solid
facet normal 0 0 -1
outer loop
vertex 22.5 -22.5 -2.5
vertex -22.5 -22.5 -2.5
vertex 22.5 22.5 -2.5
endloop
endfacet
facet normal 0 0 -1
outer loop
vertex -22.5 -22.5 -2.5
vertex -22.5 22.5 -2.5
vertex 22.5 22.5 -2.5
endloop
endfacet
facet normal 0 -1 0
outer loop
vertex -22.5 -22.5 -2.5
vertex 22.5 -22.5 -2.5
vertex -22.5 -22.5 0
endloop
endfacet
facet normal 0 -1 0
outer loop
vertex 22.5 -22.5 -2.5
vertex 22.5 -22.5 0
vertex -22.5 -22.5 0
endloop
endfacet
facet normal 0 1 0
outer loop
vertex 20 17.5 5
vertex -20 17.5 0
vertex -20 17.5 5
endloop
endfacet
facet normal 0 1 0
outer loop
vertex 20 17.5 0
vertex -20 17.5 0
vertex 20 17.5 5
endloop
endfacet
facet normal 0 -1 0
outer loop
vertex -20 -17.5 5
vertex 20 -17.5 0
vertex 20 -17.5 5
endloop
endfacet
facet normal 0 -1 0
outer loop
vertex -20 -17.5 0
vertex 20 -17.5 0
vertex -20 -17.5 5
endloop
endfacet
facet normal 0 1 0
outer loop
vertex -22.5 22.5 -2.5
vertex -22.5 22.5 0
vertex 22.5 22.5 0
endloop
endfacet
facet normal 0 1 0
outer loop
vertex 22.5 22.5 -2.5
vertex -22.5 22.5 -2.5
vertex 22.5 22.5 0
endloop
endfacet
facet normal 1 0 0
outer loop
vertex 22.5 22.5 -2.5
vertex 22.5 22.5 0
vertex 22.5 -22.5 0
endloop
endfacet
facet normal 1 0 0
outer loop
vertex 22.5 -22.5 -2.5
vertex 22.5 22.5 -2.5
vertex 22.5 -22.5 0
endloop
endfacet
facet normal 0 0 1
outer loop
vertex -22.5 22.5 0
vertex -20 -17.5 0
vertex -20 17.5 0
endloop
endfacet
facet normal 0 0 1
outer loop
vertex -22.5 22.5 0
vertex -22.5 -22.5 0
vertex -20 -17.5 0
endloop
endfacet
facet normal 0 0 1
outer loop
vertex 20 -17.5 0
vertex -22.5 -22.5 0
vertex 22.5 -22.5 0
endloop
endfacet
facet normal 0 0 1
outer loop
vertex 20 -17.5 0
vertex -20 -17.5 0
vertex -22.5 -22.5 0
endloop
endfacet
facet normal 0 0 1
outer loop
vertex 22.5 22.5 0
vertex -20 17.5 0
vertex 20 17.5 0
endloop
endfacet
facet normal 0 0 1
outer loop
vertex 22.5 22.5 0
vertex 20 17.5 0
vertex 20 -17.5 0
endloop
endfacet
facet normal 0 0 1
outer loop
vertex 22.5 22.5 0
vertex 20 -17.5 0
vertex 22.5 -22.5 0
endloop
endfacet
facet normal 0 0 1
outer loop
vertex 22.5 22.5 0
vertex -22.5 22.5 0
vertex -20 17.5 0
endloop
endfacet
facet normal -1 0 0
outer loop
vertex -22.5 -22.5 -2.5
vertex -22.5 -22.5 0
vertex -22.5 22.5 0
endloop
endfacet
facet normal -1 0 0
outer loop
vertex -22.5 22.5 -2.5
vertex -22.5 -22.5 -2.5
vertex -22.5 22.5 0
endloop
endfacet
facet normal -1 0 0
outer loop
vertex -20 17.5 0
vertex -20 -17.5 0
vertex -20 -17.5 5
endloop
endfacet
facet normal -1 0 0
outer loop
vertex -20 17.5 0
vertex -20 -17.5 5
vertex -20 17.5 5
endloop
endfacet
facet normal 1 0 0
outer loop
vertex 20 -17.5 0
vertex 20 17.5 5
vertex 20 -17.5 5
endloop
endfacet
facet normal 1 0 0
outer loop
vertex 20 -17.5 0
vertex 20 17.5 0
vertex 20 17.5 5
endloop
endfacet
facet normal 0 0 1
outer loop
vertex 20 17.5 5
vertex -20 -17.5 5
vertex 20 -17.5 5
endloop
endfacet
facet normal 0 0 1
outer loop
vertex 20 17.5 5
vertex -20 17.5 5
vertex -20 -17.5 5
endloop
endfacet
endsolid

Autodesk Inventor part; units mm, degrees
ref_plane "YZ Plane" through (0, 0, 0) normal (1, 0, 0) x (0, 1, 0)
ref_plane "XZ Plane" through (0, 0, 0) normal (0, 1, 0) x (-1, 0, 0)
ref_plane "XY Plane" through (0, 0, 0) normal (0, 0, 1) x (1, 0, 0)
sketch "Boceto1" plane through (0, 0, 0) normal (0, 0, 1) x (1, 0, 0)
  line L0 (-22.5, 22.5) -> (22.5, 22.5)
  line L1 (22.5, 22.5) -> (22.5, -22.5)
  line L2 (22.5, -22.5) -> (-22.5, -22.5)
  line L3 (-22.5, -22.5) -> (-22.5, 22.5)
  line L4 (-20, 17.5) -> (20, 17.5)
  line L5 (20, 17.5) -> (20, -17.5)
  line L6 (20, -17.5) -> (-20, -17.5)
  line L7 (-20, -17.5) -> (-20, 17.5)
  point P0 (0, 0)
  point P1 (-22.5, 0)
  point P2 (0, 22.5)
  point P3 (-20, 0)
  point P4 (0, 17.5)
  dimension "d0" = 45
  dimension "d1" = 45
  dimension "d2" = 35
  dimension "d3" = 40
extrude "Extrusión1" add sketch "Boceto1" against normal blind 2.5 contours L0 L1 L2 L3 | L4 L5 L6 L7
extrude "Extrusión2" add sketch "Boceto1" along normal blind 5 contours L4 L5 L6 L7
equation "\"d1\" = d0"
properties part number "pantalla"
